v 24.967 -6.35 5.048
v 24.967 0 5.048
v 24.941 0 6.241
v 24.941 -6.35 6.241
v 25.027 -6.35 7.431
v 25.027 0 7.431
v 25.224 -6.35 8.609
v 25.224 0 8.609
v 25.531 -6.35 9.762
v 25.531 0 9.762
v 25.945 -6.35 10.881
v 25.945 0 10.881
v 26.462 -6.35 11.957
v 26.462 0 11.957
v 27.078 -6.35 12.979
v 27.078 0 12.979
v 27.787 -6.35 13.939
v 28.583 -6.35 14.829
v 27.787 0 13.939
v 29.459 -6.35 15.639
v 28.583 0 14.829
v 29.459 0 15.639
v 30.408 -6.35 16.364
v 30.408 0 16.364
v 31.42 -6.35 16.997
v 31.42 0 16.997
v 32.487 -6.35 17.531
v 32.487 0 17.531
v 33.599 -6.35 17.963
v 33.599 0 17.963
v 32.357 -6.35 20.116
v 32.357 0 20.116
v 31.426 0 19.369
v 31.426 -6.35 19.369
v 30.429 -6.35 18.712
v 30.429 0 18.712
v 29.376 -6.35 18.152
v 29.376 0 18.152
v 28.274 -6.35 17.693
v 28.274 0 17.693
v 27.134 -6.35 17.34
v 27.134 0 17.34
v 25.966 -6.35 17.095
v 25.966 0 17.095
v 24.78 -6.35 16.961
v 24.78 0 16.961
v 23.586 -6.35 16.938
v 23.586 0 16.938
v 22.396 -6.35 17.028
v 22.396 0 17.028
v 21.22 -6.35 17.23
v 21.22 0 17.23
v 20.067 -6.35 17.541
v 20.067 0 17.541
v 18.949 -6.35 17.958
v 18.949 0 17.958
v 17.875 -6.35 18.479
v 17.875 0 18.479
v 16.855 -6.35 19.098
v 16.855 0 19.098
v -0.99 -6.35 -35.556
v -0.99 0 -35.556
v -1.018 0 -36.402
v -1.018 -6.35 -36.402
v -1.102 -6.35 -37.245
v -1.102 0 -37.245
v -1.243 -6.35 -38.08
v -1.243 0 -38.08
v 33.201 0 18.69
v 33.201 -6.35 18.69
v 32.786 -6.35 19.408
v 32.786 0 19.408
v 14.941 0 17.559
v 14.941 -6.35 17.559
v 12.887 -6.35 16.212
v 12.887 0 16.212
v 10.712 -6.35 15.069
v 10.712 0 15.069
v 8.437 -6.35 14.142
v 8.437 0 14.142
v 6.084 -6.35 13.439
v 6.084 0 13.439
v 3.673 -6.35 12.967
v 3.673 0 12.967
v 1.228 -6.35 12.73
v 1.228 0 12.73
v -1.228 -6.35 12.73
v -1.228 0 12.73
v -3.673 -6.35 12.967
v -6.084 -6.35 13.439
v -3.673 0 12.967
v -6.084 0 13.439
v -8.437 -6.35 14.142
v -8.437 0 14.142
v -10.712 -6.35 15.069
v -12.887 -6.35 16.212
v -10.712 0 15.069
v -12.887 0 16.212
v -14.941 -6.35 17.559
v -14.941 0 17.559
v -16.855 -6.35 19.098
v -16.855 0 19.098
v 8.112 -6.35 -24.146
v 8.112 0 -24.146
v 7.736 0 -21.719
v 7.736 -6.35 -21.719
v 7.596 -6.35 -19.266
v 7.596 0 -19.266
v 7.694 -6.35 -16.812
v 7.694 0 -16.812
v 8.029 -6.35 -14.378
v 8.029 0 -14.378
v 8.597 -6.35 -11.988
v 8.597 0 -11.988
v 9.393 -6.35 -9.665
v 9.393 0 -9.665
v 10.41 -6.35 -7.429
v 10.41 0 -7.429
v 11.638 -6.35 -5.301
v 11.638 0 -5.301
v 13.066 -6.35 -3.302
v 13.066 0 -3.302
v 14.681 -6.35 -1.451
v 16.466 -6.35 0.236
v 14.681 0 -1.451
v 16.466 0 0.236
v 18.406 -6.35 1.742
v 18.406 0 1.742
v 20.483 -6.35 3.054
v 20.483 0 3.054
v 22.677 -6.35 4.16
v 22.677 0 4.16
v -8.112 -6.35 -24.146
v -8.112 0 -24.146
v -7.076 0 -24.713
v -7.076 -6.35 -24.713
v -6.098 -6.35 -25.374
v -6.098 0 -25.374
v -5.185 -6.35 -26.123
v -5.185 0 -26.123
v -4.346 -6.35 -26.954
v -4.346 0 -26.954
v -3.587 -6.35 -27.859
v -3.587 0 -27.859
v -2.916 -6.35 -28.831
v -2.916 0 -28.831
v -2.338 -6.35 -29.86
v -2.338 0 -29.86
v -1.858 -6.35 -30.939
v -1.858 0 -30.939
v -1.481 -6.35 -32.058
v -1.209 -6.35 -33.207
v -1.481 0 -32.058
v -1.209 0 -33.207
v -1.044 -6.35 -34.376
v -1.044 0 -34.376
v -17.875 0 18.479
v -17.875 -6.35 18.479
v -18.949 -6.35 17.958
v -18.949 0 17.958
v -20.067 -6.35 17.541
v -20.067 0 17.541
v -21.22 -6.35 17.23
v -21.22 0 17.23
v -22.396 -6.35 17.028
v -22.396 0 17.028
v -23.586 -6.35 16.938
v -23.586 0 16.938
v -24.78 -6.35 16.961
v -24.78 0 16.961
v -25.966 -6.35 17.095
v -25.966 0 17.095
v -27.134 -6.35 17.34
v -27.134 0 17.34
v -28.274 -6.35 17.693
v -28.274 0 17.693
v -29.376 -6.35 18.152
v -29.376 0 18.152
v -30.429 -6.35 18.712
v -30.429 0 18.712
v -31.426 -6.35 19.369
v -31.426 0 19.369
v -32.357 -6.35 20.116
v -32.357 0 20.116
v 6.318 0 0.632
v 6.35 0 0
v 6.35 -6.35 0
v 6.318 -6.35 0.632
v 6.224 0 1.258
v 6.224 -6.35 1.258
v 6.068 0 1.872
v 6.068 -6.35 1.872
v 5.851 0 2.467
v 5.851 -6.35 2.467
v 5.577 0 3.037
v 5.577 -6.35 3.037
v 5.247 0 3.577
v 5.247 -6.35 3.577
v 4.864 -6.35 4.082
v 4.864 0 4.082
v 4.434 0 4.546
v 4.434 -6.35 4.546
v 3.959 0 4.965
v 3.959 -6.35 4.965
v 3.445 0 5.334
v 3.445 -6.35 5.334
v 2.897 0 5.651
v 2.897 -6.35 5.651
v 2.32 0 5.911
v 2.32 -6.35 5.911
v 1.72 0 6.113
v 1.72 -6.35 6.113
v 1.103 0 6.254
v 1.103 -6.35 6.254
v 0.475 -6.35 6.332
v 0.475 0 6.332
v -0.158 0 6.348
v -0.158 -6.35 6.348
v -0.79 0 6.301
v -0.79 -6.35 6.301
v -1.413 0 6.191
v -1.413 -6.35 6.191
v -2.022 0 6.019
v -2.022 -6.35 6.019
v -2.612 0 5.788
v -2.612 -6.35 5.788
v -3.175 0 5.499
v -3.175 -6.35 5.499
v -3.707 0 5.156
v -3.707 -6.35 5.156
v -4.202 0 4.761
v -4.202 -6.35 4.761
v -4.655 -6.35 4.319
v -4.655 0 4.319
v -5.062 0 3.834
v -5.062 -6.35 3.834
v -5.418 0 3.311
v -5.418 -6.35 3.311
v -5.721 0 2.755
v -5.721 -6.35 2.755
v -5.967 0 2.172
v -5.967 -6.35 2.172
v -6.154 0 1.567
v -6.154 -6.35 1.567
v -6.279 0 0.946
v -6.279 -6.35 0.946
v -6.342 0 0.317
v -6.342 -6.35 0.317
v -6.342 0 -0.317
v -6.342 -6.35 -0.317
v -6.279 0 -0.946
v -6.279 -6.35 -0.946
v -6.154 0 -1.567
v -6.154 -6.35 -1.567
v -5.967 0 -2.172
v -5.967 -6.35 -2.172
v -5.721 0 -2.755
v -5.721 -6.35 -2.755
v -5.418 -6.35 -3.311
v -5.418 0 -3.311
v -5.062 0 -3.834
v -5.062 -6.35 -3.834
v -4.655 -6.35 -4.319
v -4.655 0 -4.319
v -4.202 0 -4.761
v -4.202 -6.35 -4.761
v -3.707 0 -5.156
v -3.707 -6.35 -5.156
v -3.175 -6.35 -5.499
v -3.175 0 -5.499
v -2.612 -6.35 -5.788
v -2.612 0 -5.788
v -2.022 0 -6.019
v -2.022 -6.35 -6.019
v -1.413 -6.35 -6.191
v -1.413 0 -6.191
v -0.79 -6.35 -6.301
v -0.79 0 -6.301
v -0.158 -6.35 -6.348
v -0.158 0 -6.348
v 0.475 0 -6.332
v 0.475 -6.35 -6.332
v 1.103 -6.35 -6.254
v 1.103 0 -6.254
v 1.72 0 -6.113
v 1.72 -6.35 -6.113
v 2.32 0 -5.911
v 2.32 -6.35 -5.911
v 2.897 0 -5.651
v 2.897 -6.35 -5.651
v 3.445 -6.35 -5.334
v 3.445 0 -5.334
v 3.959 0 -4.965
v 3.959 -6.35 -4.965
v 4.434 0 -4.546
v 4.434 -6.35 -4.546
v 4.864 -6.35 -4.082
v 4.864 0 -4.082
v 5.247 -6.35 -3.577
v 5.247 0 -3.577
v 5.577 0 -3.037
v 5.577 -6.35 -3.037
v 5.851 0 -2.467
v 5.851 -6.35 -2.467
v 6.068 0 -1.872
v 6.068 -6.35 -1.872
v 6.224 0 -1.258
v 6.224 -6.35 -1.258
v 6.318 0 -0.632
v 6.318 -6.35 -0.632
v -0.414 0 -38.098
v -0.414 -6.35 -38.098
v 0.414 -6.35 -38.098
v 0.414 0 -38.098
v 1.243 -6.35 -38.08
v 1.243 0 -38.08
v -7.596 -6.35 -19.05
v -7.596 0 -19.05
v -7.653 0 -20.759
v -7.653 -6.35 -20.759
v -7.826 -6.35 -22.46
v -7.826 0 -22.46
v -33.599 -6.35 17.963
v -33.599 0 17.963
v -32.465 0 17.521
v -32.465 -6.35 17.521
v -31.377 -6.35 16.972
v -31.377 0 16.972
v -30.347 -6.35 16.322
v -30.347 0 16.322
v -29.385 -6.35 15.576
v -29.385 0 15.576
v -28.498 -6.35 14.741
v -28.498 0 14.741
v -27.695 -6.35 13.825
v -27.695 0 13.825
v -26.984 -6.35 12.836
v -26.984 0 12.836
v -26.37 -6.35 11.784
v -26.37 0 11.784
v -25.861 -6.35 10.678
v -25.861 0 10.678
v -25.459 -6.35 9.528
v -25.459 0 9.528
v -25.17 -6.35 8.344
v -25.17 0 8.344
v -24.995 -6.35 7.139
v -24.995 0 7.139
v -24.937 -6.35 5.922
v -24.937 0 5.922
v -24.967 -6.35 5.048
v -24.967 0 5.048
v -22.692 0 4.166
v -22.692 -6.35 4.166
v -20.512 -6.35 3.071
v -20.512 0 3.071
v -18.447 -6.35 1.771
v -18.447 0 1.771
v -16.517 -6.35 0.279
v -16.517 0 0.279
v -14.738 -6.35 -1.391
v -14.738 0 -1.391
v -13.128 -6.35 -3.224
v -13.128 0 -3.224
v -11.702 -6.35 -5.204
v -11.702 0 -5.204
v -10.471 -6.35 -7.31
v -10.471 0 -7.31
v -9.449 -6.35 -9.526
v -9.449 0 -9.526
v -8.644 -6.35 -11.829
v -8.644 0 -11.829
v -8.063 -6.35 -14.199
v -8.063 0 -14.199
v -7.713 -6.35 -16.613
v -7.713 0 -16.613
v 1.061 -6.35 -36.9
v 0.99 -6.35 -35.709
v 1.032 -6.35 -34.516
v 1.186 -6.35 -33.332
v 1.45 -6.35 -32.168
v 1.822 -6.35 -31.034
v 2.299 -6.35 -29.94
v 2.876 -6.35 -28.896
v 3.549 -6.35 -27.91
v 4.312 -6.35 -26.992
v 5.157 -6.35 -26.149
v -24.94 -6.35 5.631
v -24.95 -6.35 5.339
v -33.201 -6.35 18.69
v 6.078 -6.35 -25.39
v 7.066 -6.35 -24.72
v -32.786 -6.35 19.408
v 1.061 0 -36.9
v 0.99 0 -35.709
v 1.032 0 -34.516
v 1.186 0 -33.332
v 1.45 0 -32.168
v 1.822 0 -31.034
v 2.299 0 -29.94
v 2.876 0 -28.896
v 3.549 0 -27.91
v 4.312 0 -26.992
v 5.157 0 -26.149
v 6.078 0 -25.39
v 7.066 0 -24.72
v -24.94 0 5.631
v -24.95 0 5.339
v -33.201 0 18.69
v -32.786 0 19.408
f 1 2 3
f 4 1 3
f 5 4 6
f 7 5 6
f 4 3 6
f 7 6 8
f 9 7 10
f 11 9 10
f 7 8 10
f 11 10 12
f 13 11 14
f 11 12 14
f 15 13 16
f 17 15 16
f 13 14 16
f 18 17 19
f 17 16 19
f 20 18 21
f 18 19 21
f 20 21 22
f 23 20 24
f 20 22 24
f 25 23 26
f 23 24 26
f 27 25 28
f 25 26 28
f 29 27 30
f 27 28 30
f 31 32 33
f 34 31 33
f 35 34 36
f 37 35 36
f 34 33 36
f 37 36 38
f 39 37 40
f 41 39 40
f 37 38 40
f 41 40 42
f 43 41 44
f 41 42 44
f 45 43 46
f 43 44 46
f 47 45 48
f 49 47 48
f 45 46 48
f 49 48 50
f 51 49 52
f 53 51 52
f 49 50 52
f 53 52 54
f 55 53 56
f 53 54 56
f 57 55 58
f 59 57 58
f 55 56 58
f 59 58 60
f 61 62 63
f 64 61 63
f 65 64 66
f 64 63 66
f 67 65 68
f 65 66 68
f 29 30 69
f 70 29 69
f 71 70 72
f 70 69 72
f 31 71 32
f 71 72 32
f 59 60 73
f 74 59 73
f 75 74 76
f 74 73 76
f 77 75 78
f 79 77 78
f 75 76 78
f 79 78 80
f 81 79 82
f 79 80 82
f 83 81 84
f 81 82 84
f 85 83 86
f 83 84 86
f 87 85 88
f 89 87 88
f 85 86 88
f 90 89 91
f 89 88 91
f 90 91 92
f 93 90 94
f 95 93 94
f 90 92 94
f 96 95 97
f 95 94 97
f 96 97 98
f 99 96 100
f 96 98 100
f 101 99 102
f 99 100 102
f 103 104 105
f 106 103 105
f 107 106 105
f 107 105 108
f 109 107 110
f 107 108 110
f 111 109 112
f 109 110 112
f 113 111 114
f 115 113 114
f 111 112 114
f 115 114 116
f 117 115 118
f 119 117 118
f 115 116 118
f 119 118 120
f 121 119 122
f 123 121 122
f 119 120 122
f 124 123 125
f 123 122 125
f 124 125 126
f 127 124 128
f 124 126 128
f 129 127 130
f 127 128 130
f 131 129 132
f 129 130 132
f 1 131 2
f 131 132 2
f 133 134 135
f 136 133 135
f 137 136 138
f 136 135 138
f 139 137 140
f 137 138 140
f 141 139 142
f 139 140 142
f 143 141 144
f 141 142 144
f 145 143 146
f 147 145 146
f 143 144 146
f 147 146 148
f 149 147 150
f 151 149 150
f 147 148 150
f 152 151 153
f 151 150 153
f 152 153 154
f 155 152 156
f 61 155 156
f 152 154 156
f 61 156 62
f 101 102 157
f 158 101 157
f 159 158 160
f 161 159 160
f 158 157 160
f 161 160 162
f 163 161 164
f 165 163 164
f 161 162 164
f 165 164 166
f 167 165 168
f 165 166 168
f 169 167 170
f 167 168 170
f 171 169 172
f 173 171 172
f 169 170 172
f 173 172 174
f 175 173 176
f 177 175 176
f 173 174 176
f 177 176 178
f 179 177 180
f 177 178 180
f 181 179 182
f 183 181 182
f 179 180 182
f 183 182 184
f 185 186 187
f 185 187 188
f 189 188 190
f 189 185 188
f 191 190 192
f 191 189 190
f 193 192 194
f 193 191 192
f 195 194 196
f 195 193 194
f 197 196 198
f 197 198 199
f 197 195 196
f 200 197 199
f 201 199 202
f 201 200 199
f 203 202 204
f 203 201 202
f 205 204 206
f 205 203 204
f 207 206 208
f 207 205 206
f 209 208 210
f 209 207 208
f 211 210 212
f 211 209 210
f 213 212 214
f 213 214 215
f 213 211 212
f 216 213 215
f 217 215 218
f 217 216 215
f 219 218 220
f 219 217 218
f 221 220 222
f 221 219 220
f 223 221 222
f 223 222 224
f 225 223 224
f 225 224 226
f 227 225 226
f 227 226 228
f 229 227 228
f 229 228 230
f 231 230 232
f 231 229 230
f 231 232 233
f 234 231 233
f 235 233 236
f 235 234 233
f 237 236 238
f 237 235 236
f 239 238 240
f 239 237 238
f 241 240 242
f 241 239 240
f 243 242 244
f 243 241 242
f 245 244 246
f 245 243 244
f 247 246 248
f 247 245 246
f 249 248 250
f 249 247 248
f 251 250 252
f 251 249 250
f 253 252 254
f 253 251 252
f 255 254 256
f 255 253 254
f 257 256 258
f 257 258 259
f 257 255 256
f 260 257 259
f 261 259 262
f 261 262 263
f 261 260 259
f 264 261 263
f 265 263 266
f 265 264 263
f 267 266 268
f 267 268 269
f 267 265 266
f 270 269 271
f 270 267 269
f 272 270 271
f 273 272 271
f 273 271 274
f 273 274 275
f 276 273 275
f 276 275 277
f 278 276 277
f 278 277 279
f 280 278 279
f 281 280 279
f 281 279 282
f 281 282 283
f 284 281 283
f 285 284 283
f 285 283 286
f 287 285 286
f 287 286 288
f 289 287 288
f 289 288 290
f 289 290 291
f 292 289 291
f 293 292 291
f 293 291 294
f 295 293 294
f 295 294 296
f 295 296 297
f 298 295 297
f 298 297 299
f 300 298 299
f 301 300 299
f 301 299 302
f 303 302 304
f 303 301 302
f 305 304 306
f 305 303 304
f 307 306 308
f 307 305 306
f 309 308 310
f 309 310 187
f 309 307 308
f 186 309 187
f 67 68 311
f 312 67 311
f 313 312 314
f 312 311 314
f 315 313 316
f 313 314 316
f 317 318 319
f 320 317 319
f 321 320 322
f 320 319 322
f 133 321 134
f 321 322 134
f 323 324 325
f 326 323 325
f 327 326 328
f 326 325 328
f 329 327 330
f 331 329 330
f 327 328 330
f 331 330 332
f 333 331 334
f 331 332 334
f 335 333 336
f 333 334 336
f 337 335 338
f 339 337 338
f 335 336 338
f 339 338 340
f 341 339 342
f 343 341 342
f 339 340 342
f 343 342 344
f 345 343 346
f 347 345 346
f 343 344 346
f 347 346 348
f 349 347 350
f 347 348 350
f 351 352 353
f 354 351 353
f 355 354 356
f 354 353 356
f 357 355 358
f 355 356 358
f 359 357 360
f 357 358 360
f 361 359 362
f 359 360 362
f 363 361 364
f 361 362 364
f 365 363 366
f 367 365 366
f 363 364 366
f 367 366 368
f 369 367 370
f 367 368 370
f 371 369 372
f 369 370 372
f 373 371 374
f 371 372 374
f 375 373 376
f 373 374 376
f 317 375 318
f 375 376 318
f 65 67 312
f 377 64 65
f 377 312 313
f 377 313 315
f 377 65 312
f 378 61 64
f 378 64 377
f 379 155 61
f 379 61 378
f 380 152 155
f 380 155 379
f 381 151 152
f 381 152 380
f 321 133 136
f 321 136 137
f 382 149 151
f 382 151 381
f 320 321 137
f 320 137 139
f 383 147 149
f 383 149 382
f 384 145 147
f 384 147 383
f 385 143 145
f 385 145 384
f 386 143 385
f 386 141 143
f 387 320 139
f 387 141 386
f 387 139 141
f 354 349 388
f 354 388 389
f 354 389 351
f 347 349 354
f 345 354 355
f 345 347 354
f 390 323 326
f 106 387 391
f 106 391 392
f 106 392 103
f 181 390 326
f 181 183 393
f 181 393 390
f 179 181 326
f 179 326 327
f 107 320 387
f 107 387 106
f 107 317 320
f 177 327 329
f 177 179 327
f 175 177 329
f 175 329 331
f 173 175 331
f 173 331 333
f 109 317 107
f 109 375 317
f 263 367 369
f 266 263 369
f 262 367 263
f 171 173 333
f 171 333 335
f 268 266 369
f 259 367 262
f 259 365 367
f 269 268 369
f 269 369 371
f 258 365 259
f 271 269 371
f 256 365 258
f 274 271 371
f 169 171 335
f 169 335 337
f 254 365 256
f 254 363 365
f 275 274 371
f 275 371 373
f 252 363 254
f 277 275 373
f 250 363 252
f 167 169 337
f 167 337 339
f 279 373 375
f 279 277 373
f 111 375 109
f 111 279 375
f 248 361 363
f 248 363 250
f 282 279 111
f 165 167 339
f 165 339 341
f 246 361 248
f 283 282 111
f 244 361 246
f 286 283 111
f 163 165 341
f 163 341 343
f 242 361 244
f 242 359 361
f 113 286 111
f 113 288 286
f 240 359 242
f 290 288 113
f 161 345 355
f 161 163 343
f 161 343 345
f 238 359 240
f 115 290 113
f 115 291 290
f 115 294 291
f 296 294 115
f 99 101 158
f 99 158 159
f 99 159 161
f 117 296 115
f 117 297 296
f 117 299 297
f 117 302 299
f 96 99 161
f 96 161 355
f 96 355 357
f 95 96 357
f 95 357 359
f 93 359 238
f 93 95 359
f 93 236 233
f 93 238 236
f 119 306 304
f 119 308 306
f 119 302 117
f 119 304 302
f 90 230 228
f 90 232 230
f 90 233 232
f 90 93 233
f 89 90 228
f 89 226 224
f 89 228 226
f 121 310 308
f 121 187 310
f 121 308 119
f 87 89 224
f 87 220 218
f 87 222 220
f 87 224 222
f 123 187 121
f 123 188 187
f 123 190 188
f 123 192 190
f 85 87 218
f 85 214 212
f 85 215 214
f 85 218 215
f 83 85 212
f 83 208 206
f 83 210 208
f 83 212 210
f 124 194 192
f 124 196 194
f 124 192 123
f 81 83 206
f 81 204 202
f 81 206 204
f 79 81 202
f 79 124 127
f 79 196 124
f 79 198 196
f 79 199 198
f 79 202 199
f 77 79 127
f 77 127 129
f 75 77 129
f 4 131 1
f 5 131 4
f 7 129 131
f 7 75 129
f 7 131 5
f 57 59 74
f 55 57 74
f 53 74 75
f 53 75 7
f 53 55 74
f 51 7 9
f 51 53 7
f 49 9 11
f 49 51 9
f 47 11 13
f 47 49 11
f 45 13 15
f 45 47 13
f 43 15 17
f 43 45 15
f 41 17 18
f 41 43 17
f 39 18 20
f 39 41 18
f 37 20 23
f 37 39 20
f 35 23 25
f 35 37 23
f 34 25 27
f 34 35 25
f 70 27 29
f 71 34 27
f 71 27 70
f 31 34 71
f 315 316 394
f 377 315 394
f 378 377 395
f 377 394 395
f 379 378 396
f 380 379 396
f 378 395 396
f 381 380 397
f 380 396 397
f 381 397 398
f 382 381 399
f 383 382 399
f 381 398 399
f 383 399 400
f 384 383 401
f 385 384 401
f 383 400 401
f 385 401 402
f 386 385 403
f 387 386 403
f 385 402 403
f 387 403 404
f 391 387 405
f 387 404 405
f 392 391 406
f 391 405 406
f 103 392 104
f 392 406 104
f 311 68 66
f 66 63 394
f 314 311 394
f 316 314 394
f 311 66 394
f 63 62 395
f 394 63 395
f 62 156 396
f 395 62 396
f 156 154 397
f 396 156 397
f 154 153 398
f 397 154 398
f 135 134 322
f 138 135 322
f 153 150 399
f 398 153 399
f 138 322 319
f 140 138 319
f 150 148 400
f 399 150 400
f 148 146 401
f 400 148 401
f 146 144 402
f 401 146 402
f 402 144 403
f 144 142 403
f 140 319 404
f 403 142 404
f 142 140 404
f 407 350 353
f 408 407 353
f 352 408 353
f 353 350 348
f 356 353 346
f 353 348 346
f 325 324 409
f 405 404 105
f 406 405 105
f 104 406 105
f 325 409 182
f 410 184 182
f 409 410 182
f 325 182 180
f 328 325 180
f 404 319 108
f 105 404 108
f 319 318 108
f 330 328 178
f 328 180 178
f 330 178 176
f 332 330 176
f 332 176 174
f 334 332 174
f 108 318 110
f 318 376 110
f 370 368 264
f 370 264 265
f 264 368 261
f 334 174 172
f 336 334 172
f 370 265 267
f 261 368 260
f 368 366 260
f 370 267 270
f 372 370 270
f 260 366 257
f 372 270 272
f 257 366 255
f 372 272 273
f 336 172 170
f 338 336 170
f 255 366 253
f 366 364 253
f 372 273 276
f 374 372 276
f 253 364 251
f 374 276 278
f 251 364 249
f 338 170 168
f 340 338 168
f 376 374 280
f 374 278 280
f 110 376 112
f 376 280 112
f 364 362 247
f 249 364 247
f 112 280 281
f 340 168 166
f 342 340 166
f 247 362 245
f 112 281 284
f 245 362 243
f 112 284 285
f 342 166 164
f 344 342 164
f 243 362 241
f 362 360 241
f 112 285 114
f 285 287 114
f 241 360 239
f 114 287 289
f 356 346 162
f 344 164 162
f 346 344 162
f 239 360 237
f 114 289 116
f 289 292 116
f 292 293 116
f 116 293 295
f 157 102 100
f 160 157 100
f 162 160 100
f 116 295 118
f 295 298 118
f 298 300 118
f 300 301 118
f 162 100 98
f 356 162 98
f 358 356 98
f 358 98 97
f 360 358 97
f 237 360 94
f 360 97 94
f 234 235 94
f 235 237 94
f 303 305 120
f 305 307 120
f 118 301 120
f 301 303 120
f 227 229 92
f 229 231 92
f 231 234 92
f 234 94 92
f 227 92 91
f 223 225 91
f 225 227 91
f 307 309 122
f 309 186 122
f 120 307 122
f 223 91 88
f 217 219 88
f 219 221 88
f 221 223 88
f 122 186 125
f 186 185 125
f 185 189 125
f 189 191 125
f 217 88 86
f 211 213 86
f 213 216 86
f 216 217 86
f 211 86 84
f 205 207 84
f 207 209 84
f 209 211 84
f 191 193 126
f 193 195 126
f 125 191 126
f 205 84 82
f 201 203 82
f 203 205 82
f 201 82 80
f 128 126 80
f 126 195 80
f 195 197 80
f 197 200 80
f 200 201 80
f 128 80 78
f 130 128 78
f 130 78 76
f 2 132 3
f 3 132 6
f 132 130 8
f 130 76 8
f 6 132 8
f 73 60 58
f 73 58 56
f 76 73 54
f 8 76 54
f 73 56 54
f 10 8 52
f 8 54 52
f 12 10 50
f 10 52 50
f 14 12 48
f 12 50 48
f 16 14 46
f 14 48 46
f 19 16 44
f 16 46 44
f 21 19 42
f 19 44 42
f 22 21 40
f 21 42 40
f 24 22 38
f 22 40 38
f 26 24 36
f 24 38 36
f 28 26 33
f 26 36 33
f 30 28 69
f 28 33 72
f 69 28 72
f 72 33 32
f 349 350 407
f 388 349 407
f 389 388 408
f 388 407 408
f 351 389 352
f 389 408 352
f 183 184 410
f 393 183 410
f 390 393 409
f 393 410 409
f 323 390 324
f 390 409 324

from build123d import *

# Parameters (mm, degrees)
F0_R     = 6.35
F1_DEPTH = 6.35


with BuildPart() as f1:
    # F0 (on Front) → F1 (new body)
    with BuildSketch(Plane.XZ):
        with BuildLine():
            ThreePointArc((24.967043, 5.047776), (27.078139, 12.979448), (33.599452, 17.963487))
            ThreePointArc((33.599452, 17.963487), (32.995568, 19.05), (32.356562, 20.116235))
            ThreePointArc((32.356562, 20.116235), (24.779601, 16.960632), (16.855024, 19.098206))
            ThreePointArc((16.855024, 19.098206), (0, 12.7), (-16.855024, 19.098206))
            ThreePointArc((-16.855024, 19.098206), (-24.779601, 16.960632), (-32.356562, 20.116235))
            ThreePointArc((-32.356562, 20.116235), (-32.995568, 19.05), (-33.599452, 17.963487))
            ThreePointArc((-33.599452, 17.963487), (-27.327541, 13.339033), (-24.936894, 5.922346))
            ThreePointArc((-24.936894, 5.922346), (-24.944434, 5.484801), (-24.967043, 5.047776))
            ThreePointArc((-24.967043, 5.047776), (-12.391144, -4.196794), (-7.595568, -19.05))
            ThreePointArc((-7.595568, -19.05), (-7.725011, -21.611042), (-8.11202, -24.145982))
            ThreePointArc((-8.11202, -24.145982), (-2.916324, -28.830524), (-0.989545, -35.55568))
            ThreePointArc((-0.989545, -35.55568), (-1.05304, -36.824042), (-1.24289, -38.079722))
            ThreePointArc((-1.24289, -38.079722), (0, -38.1), (1.24289, -38.079722))
            ThreePointArc((1.24289, -38.079722), (2.298538, -29.94008), (8.11202, -24.145982))
            ThreePointArc((8.11202, -24.145982), (10.998523, -6.35), (24.967043, 5.047776))
        make_face()
        Circle(F0_R, mode=Mode.SUBTRACT)
    extrude(amount=F1_DEPTH)


solid = f1.part
